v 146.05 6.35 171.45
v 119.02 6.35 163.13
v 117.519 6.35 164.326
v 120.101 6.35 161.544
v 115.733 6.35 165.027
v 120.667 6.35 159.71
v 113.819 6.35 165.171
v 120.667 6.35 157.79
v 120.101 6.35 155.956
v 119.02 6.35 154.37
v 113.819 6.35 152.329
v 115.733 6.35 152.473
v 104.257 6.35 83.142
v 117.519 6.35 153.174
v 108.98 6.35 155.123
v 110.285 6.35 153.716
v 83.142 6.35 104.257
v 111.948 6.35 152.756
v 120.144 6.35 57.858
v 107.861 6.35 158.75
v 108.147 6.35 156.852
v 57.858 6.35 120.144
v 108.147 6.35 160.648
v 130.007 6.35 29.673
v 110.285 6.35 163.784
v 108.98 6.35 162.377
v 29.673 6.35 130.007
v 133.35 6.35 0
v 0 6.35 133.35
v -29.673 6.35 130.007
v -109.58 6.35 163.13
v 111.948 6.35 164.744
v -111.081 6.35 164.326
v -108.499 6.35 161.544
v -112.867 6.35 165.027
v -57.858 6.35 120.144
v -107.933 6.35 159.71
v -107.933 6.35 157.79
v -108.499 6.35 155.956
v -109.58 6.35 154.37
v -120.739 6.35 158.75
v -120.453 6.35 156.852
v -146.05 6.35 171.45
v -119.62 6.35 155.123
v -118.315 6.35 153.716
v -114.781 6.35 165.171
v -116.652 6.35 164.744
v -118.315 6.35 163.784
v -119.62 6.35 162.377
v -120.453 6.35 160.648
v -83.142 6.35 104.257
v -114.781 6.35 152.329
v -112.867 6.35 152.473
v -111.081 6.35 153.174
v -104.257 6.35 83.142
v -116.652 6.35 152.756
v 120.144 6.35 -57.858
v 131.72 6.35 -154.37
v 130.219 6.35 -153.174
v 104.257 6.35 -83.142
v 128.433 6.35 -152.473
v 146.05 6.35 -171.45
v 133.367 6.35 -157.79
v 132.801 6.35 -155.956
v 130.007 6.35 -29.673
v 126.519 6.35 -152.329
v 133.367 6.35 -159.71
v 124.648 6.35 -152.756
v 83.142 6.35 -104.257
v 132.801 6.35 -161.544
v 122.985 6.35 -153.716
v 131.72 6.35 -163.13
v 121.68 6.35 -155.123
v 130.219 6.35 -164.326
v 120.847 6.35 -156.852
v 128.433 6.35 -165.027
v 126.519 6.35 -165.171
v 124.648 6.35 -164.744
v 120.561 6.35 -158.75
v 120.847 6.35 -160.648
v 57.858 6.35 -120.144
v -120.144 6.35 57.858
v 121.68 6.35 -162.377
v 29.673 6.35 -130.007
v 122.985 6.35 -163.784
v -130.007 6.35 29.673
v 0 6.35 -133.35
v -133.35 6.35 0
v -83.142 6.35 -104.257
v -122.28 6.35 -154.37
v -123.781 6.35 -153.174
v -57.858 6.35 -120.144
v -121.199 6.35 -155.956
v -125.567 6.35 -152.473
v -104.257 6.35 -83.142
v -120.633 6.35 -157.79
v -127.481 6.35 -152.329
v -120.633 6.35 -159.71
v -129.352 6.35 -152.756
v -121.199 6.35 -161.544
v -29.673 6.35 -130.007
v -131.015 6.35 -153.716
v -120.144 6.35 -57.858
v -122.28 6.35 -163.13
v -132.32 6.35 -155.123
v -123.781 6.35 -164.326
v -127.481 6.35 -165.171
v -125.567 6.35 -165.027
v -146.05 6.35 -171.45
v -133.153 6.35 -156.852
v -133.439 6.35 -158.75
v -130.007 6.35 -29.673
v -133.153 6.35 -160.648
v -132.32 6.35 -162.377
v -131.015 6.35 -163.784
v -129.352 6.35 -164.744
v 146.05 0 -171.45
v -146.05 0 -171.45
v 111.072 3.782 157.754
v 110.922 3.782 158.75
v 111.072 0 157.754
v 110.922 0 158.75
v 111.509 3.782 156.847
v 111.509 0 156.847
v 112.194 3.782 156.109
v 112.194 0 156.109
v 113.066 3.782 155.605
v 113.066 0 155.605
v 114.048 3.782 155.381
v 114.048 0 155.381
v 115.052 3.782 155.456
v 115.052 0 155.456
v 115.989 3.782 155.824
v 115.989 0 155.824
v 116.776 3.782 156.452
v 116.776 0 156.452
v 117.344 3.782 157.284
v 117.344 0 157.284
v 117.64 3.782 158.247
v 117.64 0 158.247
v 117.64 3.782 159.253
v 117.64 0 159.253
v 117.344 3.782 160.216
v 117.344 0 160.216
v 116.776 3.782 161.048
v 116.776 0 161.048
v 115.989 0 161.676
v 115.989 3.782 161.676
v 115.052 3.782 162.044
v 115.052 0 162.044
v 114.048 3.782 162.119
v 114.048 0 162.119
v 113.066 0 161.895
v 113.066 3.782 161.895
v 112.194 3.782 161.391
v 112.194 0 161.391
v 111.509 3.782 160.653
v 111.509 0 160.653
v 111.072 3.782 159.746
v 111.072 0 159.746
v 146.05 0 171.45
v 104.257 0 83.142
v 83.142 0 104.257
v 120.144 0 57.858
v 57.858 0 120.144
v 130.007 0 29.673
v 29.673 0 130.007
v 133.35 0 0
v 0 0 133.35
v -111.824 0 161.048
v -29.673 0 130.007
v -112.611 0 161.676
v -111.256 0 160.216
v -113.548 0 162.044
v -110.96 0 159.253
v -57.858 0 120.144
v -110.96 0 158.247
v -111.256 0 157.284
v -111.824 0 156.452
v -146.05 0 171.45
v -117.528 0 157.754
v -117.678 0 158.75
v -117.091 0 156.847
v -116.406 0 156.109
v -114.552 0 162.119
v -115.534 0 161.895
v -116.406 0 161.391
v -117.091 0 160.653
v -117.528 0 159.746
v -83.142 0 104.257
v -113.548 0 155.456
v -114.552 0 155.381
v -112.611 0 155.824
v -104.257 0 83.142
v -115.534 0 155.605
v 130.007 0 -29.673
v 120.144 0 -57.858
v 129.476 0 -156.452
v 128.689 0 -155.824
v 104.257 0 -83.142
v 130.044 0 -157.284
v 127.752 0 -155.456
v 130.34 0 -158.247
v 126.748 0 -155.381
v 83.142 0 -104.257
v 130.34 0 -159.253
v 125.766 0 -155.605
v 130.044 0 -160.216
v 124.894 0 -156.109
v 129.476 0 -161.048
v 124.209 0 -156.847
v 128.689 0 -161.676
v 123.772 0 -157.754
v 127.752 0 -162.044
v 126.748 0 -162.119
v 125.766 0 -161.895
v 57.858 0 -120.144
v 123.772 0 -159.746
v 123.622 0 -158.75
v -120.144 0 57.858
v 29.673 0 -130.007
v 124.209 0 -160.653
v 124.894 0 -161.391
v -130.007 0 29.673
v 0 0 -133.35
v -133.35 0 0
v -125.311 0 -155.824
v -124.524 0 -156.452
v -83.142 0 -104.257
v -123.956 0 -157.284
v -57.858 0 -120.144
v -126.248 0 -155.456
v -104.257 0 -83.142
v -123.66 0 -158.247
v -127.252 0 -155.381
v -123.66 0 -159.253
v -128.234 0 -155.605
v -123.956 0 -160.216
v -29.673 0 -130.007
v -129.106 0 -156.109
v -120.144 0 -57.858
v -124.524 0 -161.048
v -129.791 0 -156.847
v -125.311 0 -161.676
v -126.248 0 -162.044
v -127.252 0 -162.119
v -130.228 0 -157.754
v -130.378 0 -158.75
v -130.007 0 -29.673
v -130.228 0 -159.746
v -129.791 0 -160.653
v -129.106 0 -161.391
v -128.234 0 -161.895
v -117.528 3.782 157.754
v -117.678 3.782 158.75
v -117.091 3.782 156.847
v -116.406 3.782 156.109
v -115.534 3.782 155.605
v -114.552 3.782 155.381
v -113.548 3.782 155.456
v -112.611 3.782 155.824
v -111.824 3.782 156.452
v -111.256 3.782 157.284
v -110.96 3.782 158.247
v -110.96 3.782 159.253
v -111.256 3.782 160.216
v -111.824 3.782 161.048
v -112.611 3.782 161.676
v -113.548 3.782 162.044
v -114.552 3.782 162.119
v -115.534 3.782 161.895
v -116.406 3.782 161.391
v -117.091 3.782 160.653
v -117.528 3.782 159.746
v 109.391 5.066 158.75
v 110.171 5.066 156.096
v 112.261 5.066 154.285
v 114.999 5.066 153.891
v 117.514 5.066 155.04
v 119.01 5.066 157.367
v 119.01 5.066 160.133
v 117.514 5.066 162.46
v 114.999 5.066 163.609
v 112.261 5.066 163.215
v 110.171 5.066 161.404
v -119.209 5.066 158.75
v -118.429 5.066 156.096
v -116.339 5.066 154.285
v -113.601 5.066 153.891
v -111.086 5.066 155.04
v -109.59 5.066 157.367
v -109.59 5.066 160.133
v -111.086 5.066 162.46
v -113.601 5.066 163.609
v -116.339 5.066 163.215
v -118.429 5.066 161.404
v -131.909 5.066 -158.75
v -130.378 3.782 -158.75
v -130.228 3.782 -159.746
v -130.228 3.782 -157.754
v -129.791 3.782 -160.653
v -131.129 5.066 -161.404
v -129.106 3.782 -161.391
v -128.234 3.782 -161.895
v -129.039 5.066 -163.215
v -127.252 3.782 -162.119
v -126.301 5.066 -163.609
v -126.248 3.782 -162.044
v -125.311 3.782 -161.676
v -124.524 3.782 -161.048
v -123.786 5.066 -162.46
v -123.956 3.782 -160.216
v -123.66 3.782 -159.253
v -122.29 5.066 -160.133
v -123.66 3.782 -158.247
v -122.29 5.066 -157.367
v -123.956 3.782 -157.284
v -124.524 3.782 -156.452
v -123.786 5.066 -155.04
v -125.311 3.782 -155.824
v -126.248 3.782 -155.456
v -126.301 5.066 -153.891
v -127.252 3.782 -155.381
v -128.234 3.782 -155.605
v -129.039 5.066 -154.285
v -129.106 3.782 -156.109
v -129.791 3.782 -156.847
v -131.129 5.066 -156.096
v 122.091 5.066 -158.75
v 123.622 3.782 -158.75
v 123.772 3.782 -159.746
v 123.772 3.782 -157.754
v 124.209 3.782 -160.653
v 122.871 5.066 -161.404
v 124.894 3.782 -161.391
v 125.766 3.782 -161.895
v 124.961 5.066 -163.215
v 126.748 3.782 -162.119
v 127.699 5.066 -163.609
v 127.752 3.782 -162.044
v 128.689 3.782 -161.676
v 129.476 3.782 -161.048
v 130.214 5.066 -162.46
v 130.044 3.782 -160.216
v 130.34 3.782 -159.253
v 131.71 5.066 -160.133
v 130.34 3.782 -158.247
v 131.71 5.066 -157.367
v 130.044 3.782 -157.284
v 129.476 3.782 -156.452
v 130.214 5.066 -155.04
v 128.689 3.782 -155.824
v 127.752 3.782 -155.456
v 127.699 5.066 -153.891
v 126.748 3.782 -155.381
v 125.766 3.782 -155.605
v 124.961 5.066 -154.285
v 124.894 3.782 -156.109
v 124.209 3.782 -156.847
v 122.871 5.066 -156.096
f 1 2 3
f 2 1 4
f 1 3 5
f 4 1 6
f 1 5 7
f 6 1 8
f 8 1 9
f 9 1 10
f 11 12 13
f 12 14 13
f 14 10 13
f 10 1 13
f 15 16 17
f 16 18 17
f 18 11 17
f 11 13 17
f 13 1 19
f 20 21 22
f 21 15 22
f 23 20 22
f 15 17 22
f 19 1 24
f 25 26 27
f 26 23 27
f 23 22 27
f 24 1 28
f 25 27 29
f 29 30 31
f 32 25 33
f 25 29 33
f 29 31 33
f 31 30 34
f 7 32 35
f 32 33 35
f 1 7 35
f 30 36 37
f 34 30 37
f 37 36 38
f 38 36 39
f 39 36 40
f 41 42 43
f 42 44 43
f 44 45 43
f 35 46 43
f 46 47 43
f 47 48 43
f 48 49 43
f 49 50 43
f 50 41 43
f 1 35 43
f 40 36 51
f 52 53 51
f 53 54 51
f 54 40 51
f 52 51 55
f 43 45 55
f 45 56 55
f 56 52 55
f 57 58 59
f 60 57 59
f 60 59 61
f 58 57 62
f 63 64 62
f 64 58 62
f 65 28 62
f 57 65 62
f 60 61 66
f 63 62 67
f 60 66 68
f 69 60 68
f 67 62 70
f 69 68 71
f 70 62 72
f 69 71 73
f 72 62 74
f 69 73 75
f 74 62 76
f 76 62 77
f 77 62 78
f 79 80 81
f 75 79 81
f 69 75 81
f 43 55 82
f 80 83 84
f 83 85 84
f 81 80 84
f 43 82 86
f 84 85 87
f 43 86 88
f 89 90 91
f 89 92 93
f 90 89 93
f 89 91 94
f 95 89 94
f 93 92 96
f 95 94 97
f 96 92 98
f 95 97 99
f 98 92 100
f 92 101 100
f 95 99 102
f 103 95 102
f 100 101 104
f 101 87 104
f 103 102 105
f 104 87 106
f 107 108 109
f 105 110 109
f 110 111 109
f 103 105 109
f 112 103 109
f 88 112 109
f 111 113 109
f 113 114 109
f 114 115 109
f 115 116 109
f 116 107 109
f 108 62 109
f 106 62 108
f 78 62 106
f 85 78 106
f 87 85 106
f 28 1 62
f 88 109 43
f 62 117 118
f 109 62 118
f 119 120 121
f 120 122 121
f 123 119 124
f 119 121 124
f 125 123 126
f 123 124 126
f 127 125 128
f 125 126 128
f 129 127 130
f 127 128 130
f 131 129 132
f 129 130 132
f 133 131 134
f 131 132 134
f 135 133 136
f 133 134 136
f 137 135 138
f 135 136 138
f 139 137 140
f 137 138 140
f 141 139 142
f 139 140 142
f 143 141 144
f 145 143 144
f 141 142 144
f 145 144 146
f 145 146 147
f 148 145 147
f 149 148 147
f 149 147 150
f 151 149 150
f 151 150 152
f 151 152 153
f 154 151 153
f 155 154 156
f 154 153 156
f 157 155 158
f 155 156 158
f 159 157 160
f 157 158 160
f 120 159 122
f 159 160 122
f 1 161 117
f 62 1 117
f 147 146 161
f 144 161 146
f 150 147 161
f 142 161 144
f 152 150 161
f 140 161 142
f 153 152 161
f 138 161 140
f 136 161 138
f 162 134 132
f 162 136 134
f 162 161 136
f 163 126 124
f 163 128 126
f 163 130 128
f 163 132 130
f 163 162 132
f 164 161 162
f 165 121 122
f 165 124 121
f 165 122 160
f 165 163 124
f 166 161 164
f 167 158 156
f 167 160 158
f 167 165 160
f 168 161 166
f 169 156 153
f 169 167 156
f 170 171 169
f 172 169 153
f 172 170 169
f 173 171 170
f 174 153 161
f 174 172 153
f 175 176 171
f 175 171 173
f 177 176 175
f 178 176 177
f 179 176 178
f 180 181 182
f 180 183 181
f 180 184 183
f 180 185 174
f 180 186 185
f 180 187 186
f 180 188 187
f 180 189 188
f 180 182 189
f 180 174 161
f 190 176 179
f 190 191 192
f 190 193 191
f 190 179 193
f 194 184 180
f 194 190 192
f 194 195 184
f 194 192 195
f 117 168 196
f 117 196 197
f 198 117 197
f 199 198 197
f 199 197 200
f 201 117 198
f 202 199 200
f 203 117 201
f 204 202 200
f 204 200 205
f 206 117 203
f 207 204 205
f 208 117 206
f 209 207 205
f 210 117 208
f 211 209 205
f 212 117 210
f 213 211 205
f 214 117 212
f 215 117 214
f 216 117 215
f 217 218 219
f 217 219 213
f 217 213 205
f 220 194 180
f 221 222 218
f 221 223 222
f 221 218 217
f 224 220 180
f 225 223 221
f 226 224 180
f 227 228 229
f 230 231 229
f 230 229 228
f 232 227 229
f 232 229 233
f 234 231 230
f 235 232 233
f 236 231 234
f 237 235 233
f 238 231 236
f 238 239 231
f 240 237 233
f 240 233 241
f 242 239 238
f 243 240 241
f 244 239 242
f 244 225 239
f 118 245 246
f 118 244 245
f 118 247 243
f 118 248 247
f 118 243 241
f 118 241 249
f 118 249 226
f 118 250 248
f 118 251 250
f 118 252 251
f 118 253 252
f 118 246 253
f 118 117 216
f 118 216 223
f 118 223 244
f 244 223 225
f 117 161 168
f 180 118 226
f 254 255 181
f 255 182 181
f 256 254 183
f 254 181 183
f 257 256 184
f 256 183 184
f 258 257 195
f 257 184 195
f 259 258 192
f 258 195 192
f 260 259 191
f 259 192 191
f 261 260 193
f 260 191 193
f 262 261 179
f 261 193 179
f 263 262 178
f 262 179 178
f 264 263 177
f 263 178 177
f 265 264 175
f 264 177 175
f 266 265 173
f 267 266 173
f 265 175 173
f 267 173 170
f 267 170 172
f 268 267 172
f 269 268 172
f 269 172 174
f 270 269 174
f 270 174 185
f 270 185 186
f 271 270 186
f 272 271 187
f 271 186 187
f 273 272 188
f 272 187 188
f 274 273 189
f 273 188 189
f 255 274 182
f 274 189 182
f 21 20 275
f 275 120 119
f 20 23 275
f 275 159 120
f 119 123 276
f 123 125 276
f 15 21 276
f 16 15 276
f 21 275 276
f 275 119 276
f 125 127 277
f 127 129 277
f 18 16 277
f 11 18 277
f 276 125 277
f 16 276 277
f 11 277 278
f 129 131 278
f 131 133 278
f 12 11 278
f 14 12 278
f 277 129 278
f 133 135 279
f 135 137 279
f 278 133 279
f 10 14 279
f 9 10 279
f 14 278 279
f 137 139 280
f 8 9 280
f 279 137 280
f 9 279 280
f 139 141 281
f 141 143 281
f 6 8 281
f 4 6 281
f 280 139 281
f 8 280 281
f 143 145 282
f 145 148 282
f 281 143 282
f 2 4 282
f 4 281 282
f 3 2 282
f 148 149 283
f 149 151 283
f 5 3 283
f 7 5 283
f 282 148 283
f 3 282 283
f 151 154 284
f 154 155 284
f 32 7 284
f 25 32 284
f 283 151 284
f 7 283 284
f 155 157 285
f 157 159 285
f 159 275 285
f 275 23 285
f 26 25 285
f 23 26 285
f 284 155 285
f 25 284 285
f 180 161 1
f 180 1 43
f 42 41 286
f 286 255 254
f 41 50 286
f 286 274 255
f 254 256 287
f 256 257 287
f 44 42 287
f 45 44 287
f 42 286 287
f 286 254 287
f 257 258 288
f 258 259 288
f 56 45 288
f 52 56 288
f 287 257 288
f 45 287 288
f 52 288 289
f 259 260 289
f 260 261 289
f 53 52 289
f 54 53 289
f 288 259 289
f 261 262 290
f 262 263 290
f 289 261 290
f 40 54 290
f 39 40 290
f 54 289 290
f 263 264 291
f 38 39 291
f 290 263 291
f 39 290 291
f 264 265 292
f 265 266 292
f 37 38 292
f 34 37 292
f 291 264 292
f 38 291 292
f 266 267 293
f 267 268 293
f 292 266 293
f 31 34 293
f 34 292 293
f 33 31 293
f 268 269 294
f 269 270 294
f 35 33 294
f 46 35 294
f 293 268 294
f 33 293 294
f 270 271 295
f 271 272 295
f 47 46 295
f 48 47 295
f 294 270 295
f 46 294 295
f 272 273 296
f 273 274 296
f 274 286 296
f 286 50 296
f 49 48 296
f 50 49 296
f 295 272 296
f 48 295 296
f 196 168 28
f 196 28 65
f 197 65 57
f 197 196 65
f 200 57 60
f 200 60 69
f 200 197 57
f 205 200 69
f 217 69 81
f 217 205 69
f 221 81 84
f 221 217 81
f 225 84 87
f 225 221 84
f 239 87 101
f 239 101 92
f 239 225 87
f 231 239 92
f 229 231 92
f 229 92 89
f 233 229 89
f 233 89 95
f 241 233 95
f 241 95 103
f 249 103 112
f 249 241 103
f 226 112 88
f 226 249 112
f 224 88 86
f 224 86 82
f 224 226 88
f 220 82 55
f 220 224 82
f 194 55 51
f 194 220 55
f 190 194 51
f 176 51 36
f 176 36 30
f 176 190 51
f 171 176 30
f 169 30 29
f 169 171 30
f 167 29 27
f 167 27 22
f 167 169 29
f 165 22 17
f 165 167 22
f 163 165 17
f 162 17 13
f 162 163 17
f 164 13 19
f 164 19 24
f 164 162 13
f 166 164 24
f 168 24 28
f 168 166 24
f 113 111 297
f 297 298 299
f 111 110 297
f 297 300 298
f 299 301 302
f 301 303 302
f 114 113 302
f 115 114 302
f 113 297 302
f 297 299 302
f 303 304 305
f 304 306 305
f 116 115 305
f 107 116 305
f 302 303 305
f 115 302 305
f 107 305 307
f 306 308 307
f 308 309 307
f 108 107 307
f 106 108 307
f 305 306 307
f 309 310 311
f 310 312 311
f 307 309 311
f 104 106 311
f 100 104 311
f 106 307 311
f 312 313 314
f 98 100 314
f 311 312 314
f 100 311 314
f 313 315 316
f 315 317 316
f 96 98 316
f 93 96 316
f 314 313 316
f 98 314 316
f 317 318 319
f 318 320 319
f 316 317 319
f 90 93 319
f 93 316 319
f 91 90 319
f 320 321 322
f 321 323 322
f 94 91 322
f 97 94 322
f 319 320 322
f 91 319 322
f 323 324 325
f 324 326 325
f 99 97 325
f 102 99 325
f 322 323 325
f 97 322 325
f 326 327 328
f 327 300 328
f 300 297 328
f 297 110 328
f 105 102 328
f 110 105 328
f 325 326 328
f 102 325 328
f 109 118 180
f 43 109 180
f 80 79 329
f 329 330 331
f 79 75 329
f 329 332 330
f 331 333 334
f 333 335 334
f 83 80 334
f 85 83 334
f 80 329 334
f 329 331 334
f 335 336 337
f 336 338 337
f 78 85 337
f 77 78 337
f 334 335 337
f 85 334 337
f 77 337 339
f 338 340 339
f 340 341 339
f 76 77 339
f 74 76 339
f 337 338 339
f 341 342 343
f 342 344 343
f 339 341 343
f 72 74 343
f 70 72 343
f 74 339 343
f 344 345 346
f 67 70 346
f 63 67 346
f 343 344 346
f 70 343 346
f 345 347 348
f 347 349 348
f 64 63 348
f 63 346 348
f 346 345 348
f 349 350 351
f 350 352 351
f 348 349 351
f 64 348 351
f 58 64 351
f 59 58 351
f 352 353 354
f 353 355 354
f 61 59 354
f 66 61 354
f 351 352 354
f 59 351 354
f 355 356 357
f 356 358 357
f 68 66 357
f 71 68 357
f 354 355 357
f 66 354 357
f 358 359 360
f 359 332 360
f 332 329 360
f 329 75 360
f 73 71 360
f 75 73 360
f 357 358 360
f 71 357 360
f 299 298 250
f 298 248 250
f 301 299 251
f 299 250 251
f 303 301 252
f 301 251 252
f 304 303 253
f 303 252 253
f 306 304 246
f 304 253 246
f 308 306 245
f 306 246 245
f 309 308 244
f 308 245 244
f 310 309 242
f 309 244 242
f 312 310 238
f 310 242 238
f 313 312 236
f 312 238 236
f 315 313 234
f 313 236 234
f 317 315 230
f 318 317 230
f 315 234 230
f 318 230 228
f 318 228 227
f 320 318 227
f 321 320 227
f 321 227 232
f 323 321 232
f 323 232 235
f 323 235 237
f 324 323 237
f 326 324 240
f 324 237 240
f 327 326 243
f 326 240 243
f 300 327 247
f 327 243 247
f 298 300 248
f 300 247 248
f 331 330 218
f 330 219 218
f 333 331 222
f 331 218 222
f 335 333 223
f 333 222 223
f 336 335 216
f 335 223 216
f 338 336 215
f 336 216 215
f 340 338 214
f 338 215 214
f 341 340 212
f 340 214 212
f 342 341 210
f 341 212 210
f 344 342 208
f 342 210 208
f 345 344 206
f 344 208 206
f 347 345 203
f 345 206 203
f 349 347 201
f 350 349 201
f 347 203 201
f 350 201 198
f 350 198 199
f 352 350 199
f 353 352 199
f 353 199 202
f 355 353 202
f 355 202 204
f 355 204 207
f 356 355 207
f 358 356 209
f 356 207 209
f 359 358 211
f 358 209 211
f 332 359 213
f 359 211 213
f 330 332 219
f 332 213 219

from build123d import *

# Parameters (mm, degrees)
SKETCH1_R                                           = 133.35
EXTRUDE_CENTER_HOLE_DEPTH                           = 6.35
CSK_FOR_1_4_FLAT_HEAD_MACHINE_SCREW_100_D           = 6.7564
CSK_FOR_1_4_FLAT_HEAD_MACHINE_SCREW_100_CSINK_D     = 12.8778
CSK_FOR_1_4_FLAT_HEAD_MACHINE_SCREW_100_CSINK_ANGLE = 100


with BuildPart() as part:
    # Sketch1 → Extrude & center hole (new body)
    with BuildSketch(Plane(origin=(0, 0, 0), x_dir=(1, 0, 0), z_dir=(0, 1, 0))):
        Polygon((0, 171.45), (146.05, 171.45), (146.05, 0), (146.05, -171.45), (-146.05, -171.45), (-146.05, 0), (-146.05, 171.45), align=None)
        Circle(SKETCH1_R, mode=Mode.SUBTRACT)
    extrude(amount=EXTRUDE_CENTER_HOLE_DEPTH)

    # CSK for 1/4 Flat Head Machine Screw (100)1 (through all)
    with Locations(Plane(origin=(0, 6.35, 0), x_dir=(1, 0, 0), z_dir=(0, 1, 0))):
        with Locations((-114.3, -158.75), (114.3, -158.75), (127, 158.75), (-127, 158.75)):
            CounterSinkHole(CSK_FOR_1_4_FLAT_HEAD_MACHINE_SCREW_100_D / 2, CSK_FOR_1_4_FLAT_HEAD_MACHINE_SCREW_100_CSINK_D / 2, counter_sink_angle=CSK_FOR_1_4_FLAT_HEAD_MACHINE_SCREW_100_CSINK_ANGLE)


solid = part.part
